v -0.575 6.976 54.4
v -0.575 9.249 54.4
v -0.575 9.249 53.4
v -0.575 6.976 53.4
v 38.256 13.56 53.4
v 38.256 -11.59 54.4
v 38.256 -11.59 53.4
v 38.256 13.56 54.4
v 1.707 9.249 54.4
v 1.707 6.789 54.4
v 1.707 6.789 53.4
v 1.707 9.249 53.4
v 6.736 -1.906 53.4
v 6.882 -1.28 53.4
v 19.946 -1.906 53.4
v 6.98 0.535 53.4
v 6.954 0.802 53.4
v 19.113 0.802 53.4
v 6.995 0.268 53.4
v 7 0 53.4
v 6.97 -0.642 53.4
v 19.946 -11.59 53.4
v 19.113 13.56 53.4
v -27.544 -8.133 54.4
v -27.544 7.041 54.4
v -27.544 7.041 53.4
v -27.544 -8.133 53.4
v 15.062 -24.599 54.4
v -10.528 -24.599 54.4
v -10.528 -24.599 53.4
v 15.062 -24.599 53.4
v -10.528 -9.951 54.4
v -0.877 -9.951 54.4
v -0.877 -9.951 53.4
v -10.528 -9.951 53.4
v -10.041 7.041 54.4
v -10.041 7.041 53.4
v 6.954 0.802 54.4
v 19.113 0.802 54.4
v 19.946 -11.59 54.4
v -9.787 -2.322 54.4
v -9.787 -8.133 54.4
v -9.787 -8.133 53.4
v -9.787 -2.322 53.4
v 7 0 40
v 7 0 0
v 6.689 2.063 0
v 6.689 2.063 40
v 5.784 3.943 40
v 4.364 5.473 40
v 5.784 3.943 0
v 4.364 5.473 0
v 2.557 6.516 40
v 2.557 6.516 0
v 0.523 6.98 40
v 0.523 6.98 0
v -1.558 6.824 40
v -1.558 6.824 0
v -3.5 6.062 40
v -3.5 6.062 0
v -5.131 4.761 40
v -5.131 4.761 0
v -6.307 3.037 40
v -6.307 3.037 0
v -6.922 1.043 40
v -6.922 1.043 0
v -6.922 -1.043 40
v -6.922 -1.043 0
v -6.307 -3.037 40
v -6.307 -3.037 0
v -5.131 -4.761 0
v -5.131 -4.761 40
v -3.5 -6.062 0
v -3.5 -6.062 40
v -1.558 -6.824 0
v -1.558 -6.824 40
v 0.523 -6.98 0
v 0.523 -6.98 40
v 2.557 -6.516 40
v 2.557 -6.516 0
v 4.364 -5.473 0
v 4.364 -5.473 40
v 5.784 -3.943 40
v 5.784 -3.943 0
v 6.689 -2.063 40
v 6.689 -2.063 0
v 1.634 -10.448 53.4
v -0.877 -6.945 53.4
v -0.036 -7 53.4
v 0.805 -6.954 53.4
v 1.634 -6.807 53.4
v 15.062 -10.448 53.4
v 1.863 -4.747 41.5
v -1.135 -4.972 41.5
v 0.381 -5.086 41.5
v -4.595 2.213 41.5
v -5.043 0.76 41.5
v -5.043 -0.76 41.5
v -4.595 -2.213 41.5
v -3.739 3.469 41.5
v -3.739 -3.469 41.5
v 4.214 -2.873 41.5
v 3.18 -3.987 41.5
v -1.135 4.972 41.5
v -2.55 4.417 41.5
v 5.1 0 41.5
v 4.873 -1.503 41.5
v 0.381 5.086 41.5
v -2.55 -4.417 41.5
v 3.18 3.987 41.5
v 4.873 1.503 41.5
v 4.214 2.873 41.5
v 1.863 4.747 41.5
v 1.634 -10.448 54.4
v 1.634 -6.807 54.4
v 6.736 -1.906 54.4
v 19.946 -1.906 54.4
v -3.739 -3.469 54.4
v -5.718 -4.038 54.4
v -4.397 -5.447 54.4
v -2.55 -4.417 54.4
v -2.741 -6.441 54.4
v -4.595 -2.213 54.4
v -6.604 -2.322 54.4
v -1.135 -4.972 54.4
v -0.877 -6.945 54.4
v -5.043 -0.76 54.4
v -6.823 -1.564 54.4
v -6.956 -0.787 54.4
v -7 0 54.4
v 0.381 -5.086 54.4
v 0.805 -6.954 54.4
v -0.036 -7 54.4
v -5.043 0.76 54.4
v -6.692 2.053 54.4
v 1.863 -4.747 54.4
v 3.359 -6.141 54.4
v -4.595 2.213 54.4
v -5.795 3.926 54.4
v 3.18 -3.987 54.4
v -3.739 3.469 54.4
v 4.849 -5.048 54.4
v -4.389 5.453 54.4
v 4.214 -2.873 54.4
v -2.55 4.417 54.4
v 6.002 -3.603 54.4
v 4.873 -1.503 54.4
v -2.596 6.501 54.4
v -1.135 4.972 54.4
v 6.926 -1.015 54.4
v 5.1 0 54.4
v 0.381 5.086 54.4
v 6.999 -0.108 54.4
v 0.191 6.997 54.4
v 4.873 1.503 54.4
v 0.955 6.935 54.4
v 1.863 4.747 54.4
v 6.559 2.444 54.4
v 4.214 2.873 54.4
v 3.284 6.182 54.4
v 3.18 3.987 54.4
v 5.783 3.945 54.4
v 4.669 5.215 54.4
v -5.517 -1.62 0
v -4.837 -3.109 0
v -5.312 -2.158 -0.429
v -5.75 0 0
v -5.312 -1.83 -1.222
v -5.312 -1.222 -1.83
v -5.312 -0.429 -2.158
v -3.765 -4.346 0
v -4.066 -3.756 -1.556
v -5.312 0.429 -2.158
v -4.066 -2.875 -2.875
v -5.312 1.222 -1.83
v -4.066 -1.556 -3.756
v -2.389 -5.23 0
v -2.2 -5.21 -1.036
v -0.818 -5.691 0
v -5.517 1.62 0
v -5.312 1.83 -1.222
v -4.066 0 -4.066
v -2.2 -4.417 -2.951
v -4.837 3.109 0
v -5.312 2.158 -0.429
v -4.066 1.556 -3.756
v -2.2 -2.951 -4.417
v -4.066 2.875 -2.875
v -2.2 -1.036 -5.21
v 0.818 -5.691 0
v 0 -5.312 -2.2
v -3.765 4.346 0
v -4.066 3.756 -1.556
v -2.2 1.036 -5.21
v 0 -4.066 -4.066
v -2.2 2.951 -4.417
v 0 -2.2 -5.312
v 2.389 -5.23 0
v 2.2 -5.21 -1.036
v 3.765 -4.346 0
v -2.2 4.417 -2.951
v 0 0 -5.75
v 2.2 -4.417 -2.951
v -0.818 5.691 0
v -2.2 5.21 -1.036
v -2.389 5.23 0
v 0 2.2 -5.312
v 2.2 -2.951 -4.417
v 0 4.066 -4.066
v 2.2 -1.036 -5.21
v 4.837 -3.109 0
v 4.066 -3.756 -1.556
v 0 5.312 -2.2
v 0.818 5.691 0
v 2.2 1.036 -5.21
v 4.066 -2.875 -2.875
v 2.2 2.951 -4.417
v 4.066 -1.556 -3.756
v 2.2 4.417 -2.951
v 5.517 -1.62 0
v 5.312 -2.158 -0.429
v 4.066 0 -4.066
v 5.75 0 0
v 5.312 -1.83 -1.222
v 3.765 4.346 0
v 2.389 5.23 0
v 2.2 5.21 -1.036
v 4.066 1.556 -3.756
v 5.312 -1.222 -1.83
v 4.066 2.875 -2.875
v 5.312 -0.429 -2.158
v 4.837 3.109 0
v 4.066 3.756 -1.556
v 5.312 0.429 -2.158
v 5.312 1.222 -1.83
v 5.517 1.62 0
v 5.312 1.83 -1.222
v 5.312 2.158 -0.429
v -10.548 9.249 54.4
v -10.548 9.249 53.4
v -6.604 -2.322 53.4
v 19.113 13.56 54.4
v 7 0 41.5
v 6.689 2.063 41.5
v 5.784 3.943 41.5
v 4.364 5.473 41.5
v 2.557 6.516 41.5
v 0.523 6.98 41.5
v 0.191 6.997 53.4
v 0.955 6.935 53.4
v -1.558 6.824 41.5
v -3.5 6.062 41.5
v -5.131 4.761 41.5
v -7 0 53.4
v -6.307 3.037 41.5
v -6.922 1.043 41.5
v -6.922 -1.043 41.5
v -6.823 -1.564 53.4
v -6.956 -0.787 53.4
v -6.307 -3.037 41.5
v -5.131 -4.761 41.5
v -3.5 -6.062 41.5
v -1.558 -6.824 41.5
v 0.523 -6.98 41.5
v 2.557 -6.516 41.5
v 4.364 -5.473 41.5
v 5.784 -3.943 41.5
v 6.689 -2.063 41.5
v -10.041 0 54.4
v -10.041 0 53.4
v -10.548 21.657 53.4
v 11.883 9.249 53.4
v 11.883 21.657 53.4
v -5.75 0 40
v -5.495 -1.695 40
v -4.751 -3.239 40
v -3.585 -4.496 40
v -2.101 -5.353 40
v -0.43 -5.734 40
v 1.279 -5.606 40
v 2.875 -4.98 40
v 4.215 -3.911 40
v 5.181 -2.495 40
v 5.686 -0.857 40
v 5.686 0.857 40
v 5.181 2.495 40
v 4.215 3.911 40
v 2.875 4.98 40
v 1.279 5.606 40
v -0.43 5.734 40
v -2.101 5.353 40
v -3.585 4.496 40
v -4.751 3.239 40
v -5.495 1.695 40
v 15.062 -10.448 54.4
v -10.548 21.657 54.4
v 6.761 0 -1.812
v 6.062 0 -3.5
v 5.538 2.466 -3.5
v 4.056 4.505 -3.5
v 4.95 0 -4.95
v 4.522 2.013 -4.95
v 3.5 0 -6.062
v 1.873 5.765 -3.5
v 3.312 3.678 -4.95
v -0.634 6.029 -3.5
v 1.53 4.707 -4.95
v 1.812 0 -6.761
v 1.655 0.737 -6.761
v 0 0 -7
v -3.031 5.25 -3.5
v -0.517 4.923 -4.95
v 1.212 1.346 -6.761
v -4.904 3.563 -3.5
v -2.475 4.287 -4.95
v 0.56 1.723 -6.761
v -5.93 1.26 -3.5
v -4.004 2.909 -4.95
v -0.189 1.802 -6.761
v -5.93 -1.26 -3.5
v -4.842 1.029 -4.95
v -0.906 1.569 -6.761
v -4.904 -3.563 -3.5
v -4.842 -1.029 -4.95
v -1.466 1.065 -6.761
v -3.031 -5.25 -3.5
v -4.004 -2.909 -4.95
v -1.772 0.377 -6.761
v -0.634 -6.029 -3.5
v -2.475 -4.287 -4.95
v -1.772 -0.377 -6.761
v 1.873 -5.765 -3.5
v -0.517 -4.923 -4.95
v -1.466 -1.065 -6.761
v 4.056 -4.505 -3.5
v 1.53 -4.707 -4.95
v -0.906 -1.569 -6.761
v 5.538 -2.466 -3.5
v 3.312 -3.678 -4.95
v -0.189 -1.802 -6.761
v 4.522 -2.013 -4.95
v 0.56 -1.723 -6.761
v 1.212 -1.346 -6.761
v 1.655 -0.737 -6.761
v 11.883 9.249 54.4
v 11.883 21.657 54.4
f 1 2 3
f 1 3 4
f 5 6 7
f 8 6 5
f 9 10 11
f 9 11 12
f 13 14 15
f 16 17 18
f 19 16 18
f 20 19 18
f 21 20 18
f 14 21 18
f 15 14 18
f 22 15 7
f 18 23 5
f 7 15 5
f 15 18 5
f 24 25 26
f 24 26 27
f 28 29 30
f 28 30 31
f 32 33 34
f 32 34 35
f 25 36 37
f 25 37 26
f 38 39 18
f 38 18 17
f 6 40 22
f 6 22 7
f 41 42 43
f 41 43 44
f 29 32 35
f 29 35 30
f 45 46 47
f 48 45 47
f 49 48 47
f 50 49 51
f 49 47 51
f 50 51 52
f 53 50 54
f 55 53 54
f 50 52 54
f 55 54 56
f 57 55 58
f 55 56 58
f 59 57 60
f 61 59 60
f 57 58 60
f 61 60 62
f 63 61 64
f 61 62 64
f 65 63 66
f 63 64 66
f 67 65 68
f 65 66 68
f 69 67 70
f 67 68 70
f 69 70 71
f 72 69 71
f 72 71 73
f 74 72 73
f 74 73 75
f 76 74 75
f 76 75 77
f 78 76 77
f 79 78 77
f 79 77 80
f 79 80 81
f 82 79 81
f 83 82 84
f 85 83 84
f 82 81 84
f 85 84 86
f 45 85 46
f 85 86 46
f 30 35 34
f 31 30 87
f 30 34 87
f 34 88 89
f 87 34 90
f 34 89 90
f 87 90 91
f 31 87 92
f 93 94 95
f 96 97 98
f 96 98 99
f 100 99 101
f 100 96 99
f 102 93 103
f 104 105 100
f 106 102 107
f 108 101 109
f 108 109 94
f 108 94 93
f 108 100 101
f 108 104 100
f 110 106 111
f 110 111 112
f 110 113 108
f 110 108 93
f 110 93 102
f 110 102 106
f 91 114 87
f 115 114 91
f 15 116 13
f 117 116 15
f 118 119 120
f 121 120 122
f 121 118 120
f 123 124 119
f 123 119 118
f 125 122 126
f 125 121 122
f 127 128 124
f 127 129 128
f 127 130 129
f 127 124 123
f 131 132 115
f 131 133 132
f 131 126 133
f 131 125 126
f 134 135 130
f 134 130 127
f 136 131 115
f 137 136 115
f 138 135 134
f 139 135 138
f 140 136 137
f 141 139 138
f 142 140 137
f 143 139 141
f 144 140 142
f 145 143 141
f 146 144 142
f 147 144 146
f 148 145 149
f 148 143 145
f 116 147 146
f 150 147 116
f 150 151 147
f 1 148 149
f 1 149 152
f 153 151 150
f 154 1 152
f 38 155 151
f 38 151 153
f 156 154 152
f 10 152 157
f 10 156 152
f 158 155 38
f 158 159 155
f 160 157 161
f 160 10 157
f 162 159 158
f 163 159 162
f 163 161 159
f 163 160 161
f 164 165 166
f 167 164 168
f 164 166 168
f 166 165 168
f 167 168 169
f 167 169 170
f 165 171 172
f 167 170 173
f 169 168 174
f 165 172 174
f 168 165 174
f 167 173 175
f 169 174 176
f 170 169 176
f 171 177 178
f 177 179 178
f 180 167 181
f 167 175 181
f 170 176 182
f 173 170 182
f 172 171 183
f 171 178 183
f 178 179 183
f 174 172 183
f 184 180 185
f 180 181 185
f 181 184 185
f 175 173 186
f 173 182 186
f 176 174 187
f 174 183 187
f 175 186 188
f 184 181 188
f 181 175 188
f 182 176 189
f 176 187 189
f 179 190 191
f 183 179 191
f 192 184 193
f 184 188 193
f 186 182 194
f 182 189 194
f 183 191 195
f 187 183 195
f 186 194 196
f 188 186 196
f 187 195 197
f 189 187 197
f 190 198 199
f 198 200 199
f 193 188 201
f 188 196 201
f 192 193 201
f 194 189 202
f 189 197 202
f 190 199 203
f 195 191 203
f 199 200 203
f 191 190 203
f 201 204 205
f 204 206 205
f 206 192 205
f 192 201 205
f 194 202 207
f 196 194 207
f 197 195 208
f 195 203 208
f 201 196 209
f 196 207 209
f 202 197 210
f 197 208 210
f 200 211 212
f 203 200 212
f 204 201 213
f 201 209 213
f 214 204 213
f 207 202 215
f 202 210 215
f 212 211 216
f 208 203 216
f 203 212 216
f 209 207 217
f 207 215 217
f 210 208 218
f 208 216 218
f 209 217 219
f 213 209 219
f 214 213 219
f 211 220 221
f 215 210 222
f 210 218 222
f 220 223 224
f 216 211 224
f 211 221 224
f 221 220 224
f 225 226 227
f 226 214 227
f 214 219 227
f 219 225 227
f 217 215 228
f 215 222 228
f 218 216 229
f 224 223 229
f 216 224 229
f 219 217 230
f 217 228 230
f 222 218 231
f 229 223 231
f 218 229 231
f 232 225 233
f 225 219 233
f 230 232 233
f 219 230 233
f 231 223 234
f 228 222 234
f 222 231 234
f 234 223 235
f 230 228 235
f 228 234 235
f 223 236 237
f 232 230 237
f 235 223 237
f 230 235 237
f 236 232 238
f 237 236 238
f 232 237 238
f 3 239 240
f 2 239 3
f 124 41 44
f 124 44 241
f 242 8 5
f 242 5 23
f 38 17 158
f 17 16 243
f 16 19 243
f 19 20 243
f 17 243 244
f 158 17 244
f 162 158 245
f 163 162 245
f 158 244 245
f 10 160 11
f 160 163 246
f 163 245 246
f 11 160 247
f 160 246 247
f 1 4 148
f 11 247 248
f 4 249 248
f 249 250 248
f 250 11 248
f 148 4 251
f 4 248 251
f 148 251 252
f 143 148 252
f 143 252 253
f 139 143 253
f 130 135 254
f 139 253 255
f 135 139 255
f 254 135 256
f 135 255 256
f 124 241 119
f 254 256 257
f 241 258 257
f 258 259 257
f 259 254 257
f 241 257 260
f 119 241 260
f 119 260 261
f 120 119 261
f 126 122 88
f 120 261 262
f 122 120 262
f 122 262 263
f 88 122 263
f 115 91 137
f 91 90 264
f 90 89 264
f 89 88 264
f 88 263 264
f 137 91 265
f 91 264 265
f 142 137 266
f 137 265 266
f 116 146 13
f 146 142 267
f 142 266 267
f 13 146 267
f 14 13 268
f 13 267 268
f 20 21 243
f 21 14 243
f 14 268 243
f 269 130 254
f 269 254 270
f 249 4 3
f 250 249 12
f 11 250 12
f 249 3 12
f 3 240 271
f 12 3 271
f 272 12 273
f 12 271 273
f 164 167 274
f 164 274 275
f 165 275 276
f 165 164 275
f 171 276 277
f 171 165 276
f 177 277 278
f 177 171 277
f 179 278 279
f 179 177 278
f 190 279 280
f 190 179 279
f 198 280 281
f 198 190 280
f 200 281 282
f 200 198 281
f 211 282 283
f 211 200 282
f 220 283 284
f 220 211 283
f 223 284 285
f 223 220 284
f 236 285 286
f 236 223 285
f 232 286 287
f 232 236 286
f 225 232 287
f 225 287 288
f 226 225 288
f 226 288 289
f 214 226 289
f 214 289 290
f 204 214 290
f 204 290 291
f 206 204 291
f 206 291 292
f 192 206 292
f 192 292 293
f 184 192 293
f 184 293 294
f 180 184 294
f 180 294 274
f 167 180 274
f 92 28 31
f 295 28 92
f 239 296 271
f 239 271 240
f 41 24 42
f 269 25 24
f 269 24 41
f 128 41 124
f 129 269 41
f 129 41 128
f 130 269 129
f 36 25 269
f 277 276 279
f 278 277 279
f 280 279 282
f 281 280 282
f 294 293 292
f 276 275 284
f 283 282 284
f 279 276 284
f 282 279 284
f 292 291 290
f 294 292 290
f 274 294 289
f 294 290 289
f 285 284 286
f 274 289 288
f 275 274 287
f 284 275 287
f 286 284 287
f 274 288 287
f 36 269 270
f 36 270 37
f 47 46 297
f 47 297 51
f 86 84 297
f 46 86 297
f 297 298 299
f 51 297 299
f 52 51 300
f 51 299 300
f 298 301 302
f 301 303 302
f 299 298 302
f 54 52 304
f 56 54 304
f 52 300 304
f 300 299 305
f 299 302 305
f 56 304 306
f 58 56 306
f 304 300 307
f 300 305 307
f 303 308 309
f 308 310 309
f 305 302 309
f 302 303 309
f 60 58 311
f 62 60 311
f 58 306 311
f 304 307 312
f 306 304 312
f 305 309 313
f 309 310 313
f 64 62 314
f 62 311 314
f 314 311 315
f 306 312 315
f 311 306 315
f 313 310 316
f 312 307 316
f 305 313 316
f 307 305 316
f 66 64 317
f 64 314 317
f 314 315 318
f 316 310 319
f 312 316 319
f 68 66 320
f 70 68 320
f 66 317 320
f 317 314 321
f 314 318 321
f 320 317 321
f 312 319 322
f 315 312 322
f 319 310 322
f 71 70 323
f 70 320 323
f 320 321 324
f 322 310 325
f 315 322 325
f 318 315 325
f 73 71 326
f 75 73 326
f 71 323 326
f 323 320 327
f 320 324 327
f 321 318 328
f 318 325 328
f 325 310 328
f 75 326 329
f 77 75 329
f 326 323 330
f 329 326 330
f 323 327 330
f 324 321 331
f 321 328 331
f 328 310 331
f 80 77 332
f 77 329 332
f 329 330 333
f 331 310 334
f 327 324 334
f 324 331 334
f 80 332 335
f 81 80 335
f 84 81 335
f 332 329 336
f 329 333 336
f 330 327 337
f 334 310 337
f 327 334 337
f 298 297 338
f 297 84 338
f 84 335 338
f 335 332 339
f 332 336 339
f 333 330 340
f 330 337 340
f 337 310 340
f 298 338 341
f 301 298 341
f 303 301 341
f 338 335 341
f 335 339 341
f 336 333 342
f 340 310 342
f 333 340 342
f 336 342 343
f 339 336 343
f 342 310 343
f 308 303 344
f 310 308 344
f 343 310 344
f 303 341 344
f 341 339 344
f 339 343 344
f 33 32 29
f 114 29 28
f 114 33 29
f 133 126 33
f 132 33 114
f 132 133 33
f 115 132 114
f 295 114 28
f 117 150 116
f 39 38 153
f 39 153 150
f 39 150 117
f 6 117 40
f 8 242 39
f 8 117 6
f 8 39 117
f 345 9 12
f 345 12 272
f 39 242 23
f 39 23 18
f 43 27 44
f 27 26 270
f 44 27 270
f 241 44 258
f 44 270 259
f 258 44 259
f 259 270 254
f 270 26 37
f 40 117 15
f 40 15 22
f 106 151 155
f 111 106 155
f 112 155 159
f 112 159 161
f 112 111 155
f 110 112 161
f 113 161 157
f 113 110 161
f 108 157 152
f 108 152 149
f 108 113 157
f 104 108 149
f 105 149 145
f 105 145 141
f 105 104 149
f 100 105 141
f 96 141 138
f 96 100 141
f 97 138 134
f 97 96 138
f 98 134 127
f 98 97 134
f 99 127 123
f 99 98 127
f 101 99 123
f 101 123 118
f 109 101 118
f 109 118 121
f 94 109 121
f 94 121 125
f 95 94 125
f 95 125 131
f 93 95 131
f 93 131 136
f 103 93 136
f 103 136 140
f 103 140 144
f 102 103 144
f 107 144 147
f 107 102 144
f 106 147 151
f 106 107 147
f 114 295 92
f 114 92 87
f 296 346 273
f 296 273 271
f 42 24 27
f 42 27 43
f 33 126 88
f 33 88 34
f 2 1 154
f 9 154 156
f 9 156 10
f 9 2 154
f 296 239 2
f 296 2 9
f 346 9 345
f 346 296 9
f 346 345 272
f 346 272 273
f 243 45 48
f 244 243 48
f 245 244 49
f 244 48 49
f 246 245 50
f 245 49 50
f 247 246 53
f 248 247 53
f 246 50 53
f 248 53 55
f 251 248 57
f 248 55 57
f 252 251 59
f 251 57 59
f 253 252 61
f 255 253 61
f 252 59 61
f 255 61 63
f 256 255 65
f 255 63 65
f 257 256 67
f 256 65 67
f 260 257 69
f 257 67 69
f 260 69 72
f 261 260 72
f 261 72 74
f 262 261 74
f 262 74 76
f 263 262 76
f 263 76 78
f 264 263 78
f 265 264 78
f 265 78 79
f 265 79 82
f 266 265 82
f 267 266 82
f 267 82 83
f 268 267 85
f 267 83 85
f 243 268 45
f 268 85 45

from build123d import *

# Parameters (mm, degrees)
F0_R      = 7
F1_DEPTH  = 7
F2_R      = 6.99999
F4_DEPTH  = 40
F5_R      = 7
F5_R_2    = 5.75
F6_DEPTH  = 1.5
F7_R      = 7
F7_R_2    = 5.1
F8_DEPTH  = 12.9
F10_DEPTH = 1


# Not quite as in the source:
# - a fillet or chamfer is up to 0.001 mm smaller than in the source, because OpenCascade refuses the exact size


with BuildPart() as f1:
    # F0 (on Top) → F1 (new body)
    with BuildSketch(Plane.XY):
        Circle(F0_R)
        with BuildLine():
            ThreePointArc((-5.75, 0), (0, 5.75), (5.75, 0))
            ThreePointArc((5.75, 0), (0, -5.75), (-5.75, 0))
        make_face(mode=Mode.SUBTRACT)
        with BuildLine():
            Line((-5.75, 0), (5.75, 0))
            ThreePointArc((5.75, 0), (0, 5.75), (-5.75, 0))
        make_face()
        with BuildLine():
            ThreePointArc((-5.75, 0), (0, -5.75), (5.75, 0))
            Line((5.75, 0), (-5.75, 0))
        make_face()
    extrude(amount=-F1_DEPTH)

    # F2 (radius 7 in the source; OpenCascade refuses exactly that, so slightly less here)
    f2_edges = [f1.edges().sort_by_distance(p)[0] for p in [
        (-7, 0, -7),
    ]]
    fillet(f2_edges, radius=F2_R)

    # F0 (on Top) → F3 (revolve, cut)
    with BuildSketch(Plane.XY):
        with BuildLine():
            ThreePointArc((-5.75, 0), (0, -5.75), (5.75, 0))
            Line((5.75, 0), (-5.75, 0))
        make_face()
    revolve(axis=Axis((0, 0, 0), (1, 0, 0)), mode=Mode.SUBTRACT)

    # F4 (add): a face of the model
    f4_faces = [f1.faces().sort_by_distance(p)[0] for p in [
        (-6.8020101013, 0, 0),
    ]]
    extrude(f4_faces, amount=F4_DEPTH)

    # F5 (on face) → F6 (join)
    with BuildSketch(Plane.XY.offset(40)):
        Circle(F5_R)
        Circle(F5_R_2, mode=Mode.SUBTRACT)
        Circle(F5_R_2)
    extrude(amount=F6_DEPTH)

    # F7 (on face) → F8 (join)
    with BuildSketch(Plane.XY.offset(41.5)):
        Circle(F7_R)
        Circle(F7_R_2, mode=Mode.SUBTRACT)
    extrude(amount=F8_DEPTH)

    # F9 (on face) → F10 (join)
    with BuildSketch(Plane.XY.offset(54.4)):
        with BuildLine():
            ThreePointArc((-6.6038061512, -2.3215822875), (-6.9002406863, -1.1775731276), (-7, 0))
            Line((-7, 0), (-10.0409816951, 0))
            Line((-10.0409816951, 0), (-10.0409816951, 7.0408415049))
            Line((-10.0409816951, 7.0408415049), (-27.5440905243, 7.0408415049))
            Line((-27.5440905243, 7.0408415049), (-27.5440905243, -6.5598203801))
            Line((-27.5440905243, -6.5598203801), (-27.5440905243, -8.1330426037))
            Line((-27.5440905243, -8.1330426037), (-9.7872372717, -8.1330426037))
            Line((-9.7872372717, -8.1330426037), (-9.7872372717, -2.3215822875))
            Line((-9.7872372717, -2.3215822875), (-6.6038061512, -2.3215822875))
        make_face()
        with BuildLine():
            Line((-0.5746171277, 9.2485286327), (-0.5746171277, 6.9763755028))
            ThreePointArc((-0.5746171277, 6.9763755028), (0.5741414209, 6.9764146686), (1.7074374482, 6.7885681377))
            Line((1.7074374482, 6.7885681377), (1.7074374482, 9.2485286327))
            Line((1.7074374482, 9.2485286327), (11.8826339021, 9.2485286327))
            Line((11.8826339021, 9.2485286327), (11.8826339021, 21.6566864401))
            Line((11.8826339021, 21.6566864401), (-10.5484733358, 21.6566864401))
            Line((-10.5484733358, 21.6566864401), (-10.5484733358, 9.2485286327))
            Line((-10.5484733358, 9.2485286327), (-7.0214094594, 9.2485286327))
            Line((-7.0214094594, 9.2485286327), (-0.5746171277, 9.2485286327))
        make_face()
        with BuildLine():
            Line((14.655204518, 0.8017900982), (6.9539292949, 0.8017900982))
            ThreePointArc((6.9539292949, 0.8017900982), (6.9884728326, 0.4015563072), (7, 0))
            ThreePointArc((7, 0), (6.9335784443, -0.9620238859), (6.735574298, -1.9057908794))
            Line((6.735574298, -1.9057908794), (19.9458785355, -1.9057908794))
            Line((19.9458785355, -1.9057908794), (19.9458785355, -11.5896631032))
            Line((19.9458785355, -11.5896631032), (38.256034255, -11.5896631032))
            Line((38.256034255, -11.5896631032), (38.256034255, 13.5597093031))
            Line((38.256034255, 13.5597093031), (19.1134941834, 13.5597093031))
            Line((19.1134941834, 13.5597093031), (19.1134941834, 0.8017900982))
            Line((19.1134941834, 0.8017900982), (14.655204518, 0.8017900982))
        make_face()
        with BuildLine():
            ThreePointArc((1.6340564471, -6.8066041113), (0.3847522235, -6.989418125), (-0.8770696547, -6.9448361263))
            Line((-0.8770696547, -6.9448361263), (-0.8770696547, -9.9506975346))
            Line((-0.8770696547, -9.9506975346), (-10.5280578136, -9.9506975346))
            Line((-10.5280578136, -9.9506975346), (-10.5280578136, -24.5994888246))
            Line((-10.5280578136, -24.5994888246), (15.0621160865, -24.5994888246))
            Line((15.0621160865, -24.5994888246), (15.0621160865, -10.4480329901))
            Line((15.0621160865, -10.4480329901), (1.6340564471, -10.4480329901))
            Line((1.6340564471, -10.4480329901), (1.6340564471, -6.8066041113))
        make_face()
    extrude(amount=-F10_DEPTH)


solid = f1.part
